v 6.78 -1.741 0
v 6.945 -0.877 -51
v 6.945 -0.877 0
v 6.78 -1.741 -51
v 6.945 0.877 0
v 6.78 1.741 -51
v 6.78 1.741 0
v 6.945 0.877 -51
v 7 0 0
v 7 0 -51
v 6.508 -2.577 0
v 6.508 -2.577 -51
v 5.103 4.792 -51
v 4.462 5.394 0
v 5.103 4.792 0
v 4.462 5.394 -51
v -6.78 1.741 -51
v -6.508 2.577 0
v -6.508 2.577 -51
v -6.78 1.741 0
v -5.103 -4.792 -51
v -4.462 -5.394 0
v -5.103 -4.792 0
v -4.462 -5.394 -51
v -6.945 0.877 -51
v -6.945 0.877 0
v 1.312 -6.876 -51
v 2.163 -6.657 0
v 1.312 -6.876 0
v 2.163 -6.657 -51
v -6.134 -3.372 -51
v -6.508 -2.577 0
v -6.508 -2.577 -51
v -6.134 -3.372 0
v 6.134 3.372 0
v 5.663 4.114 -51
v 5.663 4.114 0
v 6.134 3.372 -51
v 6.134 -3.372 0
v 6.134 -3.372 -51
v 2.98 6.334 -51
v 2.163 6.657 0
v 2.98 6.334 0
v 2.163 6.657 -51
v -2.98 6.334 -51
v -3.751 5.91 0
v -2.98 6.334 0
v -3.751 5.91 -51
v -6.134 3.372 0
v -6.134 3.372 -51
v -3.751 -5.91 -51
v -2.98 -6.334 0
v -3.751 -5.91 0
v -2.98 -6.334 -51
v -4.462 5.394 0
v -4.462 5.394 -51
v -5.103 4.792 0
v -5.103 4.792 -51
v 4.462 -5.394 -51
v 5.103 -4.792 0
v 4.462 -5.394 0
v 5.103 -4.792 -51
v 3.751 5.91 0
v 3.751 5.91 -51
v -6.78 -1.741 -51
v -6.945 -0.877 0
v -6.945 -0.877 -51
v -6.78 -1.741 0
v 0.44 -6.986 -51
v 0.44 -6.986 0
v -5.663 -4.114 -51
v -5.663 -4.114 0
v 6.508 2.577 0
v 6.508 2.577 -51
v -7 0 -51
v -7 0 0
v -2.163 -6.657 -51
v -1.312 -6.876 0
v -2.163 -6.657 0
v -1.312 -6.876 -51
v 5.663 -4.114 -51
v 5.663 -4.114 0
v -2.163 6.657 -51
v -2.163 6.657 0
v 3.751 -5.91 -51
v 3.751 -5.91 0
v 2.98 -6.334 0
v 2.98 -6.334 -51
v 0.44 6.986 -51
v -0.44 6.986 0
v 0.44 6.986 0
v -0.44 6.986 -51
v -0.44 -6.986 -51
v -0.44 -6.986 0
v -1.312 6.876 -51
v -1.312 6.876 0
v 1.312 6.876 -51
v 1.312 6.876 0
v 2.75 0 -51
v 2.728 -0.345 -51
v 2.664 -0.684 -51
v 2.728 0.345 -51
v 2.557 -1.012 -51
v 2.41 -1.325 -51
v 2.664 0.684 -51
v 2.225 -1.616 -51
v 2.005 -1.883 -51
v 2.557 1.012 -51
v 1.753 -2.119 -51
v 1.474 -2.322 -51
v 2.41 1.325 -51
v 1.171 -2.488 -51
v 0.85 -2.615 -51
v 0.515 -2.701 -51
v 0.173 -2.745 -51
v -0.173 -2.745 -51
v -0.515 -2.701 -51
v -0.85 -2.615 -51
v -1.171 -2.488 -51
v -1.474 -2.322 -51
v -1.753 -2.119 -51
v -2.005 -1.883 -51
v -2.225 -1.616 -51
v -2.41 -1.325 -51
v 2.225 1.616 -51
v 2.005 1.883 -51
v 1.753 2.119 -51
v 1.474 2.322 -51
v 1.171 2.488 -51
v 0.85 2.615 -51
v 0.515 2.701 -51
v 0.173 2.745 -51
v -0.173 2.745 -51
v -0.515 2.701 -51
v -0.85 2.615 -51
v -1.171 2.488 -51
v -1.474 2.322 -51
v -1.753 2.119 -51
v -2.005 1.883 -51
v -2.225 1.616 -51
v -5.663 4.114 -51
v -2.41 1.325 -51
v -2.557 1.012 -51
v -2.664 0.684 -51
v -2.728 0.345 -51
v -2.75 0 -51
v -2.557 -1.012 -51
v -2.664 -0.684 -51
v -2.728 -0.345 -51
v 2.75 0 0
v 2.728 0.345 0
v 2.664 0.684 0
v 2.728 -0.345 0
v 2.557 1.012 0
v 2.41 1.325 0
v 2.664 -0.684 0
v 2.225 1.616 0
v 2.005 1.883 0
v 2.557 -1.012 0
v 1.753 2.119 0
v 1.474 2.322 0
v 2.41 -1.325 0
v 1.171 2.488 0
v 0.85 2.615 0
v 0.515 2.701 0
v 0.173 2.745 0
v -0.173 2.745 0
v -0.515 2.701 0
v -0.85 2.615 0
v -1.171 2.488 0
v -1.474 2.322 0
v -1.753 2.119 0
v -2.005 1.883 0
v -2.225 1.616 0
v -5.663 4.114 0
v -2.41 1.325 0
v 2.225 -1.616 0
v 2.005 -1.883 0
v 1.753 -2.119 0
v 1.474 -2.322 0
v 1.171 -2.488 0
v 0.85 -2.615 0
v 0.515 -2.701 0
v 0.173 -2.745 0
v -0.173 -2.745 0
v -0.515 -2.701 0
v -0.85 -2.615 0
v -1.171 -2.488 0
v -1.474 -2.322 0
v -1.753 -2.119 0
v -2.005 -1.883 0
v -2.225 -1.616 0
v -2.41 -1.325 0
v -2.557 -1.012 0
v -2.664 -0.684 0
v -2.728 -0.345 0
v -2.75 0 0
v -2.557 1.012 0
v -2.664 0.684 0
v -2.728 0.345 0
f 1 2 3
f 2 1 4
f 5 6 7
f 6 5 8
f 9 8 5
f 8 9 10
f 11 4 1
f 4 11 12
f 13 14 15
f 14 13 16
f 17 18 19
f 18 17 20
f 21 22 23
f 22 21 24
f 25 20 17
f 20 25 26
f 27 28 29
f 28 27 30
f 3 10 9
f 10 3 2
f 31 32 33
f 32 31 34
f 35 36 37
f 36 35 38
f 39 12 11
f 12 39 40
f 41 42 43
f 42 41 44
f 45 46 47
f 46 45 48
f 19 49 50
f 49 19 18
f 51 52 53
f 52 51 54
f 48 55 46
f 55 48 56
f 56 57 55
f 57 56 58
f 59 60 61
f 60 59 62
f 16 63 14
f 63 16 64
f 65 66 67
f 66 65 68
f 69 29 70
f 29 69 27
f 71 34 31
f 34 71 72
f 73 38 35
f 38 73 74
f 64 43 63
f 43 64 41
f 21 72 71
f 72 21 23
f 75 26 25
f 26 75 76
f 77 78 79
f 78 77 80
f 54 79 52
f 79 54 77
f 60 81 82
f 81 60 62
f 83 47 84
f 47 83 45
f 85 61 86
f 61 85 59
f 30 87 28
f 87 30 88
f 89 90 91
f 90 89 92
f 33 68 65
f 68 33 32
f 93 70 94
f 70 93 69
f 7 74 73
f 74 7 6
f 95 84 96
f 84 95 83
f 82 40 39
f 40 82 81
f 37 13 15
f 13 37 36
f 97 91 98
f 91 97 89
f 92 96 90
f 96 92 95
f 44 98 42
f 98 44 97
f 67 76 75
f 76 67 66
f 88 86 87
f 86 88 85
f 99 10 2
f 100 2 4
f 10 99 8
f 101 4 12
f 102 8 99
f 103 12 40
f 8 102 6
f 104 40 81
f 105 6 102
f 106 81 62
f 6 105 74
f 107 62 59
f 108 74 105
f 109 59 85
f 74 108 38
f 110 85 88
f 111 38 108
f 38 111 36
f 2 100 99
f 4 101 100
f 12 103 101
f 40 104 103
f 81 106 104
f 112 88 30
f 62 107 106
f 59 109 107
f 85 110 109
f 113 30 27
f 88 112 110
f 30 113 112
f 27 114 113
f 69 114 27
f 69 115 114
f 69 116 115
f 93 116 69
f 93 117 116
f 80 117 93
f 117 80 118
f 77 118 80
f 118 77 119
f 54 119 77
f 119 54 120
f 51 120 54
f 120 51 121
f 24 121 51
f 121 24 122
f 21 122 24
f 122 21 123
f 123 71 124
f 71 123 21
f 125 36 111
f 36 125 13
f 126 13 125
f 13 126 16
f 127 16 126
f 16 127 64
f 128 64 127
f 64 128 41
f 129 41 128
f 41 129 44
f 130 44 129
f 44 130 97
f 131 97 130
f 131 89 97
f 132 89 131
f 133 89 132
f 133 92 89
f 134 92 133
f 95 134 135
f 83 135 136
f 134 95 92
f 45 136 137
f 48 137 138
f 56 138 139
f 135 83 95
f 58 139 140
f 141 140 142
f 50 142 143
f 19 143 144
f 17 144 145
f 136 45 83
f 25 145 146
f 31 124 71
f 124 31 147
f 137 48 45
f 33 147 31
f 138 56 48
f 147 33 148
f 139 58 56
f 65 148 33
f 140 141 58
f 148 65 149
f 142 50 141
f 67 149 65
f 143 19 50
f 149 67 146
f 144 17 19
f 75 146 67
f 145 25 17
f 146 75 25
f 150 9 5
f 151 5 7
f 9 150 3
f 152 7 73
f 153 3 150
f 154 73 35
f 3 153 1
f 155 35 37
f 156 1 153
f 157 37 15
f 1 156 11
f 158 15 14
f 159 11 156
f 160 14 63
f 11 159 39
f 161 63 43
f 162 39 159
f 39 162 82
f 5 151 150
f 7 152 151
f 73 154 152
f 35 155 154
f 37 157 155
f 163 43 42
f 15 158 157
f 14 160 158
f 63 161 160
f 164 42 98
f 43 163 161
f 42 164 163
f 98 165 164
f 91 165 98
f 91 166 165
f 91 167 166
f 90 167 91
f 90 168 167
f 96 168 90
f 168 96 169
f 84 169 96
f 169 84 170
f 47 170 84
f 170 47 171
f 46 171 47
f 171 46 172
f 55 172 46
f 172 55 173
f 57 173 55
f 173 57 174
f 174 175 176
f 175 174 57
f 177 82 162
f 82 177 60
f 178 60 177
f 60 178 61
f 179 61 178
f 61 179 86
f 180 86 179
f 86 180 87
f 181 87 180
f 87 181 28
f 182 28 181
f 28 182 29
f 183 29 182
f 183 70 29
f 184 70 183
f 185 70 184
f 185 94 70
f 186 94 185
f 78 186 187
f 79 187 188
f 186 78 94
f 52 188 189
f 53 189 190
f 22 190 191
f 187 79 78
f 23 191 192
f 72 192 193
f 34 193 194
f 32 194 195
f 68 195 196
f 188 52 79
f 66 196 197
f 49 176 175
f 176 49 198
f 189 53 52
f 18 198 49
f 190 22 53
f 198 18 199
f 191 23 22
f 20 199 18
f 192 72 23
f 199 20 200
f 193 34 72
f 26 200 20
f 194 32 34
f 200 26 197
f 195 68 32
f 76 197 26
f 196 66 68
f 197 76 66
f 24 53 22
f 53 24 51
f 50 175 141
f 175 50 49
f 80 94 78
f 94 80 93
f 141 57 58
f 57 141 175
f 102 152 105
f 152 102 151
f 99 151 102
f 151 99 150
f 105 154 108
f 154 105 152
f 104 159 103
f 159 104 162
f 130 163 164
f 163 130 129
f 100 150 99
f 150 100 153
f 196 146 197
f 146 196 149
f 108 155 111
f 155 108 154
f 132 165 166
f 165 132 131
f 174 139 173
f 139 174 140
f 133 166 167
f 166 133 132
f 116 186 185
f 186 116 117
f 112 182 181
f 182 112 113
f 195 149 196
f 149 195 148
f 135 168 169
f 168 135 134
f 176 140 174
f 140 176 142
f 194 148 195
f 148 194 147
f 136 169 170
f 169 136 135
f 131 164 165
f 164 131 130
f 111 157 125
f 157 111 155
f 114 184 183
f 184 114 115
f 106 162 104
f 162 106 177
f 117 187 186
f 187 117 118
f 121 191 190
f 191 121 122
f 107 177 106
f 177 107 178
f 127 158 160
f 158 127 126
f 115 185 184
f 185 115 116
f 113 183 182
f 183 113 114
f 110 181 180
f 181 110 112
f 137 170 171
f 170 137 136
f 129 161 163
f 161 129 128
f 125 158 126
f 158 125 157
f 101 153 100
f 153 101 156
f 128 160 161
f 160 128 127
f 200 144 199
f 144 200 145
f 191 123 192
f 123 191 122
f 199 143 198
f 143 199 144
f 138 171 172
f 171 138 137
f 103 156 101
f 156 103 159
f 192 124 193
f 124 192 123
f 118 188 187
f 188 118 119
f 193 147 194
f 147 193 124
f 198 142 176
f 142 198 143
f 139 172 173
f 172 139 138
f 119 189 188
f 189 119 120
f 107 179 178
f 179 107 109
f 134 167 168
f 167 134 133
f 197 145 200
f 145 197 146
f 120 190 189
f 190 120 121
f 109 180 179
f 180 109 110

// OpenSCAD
$fn = 50;


difference() {
	union() {
		translate(v = [0, 0, -51.0000000000]) {
			cylinder(h = 51, r = 7.0000000000);
		}
	}
	union() {
		#translate(v = [0, 0, -51]) {
			cylinder(h = 51, r = 2.7500000000);
		}
	}
}
